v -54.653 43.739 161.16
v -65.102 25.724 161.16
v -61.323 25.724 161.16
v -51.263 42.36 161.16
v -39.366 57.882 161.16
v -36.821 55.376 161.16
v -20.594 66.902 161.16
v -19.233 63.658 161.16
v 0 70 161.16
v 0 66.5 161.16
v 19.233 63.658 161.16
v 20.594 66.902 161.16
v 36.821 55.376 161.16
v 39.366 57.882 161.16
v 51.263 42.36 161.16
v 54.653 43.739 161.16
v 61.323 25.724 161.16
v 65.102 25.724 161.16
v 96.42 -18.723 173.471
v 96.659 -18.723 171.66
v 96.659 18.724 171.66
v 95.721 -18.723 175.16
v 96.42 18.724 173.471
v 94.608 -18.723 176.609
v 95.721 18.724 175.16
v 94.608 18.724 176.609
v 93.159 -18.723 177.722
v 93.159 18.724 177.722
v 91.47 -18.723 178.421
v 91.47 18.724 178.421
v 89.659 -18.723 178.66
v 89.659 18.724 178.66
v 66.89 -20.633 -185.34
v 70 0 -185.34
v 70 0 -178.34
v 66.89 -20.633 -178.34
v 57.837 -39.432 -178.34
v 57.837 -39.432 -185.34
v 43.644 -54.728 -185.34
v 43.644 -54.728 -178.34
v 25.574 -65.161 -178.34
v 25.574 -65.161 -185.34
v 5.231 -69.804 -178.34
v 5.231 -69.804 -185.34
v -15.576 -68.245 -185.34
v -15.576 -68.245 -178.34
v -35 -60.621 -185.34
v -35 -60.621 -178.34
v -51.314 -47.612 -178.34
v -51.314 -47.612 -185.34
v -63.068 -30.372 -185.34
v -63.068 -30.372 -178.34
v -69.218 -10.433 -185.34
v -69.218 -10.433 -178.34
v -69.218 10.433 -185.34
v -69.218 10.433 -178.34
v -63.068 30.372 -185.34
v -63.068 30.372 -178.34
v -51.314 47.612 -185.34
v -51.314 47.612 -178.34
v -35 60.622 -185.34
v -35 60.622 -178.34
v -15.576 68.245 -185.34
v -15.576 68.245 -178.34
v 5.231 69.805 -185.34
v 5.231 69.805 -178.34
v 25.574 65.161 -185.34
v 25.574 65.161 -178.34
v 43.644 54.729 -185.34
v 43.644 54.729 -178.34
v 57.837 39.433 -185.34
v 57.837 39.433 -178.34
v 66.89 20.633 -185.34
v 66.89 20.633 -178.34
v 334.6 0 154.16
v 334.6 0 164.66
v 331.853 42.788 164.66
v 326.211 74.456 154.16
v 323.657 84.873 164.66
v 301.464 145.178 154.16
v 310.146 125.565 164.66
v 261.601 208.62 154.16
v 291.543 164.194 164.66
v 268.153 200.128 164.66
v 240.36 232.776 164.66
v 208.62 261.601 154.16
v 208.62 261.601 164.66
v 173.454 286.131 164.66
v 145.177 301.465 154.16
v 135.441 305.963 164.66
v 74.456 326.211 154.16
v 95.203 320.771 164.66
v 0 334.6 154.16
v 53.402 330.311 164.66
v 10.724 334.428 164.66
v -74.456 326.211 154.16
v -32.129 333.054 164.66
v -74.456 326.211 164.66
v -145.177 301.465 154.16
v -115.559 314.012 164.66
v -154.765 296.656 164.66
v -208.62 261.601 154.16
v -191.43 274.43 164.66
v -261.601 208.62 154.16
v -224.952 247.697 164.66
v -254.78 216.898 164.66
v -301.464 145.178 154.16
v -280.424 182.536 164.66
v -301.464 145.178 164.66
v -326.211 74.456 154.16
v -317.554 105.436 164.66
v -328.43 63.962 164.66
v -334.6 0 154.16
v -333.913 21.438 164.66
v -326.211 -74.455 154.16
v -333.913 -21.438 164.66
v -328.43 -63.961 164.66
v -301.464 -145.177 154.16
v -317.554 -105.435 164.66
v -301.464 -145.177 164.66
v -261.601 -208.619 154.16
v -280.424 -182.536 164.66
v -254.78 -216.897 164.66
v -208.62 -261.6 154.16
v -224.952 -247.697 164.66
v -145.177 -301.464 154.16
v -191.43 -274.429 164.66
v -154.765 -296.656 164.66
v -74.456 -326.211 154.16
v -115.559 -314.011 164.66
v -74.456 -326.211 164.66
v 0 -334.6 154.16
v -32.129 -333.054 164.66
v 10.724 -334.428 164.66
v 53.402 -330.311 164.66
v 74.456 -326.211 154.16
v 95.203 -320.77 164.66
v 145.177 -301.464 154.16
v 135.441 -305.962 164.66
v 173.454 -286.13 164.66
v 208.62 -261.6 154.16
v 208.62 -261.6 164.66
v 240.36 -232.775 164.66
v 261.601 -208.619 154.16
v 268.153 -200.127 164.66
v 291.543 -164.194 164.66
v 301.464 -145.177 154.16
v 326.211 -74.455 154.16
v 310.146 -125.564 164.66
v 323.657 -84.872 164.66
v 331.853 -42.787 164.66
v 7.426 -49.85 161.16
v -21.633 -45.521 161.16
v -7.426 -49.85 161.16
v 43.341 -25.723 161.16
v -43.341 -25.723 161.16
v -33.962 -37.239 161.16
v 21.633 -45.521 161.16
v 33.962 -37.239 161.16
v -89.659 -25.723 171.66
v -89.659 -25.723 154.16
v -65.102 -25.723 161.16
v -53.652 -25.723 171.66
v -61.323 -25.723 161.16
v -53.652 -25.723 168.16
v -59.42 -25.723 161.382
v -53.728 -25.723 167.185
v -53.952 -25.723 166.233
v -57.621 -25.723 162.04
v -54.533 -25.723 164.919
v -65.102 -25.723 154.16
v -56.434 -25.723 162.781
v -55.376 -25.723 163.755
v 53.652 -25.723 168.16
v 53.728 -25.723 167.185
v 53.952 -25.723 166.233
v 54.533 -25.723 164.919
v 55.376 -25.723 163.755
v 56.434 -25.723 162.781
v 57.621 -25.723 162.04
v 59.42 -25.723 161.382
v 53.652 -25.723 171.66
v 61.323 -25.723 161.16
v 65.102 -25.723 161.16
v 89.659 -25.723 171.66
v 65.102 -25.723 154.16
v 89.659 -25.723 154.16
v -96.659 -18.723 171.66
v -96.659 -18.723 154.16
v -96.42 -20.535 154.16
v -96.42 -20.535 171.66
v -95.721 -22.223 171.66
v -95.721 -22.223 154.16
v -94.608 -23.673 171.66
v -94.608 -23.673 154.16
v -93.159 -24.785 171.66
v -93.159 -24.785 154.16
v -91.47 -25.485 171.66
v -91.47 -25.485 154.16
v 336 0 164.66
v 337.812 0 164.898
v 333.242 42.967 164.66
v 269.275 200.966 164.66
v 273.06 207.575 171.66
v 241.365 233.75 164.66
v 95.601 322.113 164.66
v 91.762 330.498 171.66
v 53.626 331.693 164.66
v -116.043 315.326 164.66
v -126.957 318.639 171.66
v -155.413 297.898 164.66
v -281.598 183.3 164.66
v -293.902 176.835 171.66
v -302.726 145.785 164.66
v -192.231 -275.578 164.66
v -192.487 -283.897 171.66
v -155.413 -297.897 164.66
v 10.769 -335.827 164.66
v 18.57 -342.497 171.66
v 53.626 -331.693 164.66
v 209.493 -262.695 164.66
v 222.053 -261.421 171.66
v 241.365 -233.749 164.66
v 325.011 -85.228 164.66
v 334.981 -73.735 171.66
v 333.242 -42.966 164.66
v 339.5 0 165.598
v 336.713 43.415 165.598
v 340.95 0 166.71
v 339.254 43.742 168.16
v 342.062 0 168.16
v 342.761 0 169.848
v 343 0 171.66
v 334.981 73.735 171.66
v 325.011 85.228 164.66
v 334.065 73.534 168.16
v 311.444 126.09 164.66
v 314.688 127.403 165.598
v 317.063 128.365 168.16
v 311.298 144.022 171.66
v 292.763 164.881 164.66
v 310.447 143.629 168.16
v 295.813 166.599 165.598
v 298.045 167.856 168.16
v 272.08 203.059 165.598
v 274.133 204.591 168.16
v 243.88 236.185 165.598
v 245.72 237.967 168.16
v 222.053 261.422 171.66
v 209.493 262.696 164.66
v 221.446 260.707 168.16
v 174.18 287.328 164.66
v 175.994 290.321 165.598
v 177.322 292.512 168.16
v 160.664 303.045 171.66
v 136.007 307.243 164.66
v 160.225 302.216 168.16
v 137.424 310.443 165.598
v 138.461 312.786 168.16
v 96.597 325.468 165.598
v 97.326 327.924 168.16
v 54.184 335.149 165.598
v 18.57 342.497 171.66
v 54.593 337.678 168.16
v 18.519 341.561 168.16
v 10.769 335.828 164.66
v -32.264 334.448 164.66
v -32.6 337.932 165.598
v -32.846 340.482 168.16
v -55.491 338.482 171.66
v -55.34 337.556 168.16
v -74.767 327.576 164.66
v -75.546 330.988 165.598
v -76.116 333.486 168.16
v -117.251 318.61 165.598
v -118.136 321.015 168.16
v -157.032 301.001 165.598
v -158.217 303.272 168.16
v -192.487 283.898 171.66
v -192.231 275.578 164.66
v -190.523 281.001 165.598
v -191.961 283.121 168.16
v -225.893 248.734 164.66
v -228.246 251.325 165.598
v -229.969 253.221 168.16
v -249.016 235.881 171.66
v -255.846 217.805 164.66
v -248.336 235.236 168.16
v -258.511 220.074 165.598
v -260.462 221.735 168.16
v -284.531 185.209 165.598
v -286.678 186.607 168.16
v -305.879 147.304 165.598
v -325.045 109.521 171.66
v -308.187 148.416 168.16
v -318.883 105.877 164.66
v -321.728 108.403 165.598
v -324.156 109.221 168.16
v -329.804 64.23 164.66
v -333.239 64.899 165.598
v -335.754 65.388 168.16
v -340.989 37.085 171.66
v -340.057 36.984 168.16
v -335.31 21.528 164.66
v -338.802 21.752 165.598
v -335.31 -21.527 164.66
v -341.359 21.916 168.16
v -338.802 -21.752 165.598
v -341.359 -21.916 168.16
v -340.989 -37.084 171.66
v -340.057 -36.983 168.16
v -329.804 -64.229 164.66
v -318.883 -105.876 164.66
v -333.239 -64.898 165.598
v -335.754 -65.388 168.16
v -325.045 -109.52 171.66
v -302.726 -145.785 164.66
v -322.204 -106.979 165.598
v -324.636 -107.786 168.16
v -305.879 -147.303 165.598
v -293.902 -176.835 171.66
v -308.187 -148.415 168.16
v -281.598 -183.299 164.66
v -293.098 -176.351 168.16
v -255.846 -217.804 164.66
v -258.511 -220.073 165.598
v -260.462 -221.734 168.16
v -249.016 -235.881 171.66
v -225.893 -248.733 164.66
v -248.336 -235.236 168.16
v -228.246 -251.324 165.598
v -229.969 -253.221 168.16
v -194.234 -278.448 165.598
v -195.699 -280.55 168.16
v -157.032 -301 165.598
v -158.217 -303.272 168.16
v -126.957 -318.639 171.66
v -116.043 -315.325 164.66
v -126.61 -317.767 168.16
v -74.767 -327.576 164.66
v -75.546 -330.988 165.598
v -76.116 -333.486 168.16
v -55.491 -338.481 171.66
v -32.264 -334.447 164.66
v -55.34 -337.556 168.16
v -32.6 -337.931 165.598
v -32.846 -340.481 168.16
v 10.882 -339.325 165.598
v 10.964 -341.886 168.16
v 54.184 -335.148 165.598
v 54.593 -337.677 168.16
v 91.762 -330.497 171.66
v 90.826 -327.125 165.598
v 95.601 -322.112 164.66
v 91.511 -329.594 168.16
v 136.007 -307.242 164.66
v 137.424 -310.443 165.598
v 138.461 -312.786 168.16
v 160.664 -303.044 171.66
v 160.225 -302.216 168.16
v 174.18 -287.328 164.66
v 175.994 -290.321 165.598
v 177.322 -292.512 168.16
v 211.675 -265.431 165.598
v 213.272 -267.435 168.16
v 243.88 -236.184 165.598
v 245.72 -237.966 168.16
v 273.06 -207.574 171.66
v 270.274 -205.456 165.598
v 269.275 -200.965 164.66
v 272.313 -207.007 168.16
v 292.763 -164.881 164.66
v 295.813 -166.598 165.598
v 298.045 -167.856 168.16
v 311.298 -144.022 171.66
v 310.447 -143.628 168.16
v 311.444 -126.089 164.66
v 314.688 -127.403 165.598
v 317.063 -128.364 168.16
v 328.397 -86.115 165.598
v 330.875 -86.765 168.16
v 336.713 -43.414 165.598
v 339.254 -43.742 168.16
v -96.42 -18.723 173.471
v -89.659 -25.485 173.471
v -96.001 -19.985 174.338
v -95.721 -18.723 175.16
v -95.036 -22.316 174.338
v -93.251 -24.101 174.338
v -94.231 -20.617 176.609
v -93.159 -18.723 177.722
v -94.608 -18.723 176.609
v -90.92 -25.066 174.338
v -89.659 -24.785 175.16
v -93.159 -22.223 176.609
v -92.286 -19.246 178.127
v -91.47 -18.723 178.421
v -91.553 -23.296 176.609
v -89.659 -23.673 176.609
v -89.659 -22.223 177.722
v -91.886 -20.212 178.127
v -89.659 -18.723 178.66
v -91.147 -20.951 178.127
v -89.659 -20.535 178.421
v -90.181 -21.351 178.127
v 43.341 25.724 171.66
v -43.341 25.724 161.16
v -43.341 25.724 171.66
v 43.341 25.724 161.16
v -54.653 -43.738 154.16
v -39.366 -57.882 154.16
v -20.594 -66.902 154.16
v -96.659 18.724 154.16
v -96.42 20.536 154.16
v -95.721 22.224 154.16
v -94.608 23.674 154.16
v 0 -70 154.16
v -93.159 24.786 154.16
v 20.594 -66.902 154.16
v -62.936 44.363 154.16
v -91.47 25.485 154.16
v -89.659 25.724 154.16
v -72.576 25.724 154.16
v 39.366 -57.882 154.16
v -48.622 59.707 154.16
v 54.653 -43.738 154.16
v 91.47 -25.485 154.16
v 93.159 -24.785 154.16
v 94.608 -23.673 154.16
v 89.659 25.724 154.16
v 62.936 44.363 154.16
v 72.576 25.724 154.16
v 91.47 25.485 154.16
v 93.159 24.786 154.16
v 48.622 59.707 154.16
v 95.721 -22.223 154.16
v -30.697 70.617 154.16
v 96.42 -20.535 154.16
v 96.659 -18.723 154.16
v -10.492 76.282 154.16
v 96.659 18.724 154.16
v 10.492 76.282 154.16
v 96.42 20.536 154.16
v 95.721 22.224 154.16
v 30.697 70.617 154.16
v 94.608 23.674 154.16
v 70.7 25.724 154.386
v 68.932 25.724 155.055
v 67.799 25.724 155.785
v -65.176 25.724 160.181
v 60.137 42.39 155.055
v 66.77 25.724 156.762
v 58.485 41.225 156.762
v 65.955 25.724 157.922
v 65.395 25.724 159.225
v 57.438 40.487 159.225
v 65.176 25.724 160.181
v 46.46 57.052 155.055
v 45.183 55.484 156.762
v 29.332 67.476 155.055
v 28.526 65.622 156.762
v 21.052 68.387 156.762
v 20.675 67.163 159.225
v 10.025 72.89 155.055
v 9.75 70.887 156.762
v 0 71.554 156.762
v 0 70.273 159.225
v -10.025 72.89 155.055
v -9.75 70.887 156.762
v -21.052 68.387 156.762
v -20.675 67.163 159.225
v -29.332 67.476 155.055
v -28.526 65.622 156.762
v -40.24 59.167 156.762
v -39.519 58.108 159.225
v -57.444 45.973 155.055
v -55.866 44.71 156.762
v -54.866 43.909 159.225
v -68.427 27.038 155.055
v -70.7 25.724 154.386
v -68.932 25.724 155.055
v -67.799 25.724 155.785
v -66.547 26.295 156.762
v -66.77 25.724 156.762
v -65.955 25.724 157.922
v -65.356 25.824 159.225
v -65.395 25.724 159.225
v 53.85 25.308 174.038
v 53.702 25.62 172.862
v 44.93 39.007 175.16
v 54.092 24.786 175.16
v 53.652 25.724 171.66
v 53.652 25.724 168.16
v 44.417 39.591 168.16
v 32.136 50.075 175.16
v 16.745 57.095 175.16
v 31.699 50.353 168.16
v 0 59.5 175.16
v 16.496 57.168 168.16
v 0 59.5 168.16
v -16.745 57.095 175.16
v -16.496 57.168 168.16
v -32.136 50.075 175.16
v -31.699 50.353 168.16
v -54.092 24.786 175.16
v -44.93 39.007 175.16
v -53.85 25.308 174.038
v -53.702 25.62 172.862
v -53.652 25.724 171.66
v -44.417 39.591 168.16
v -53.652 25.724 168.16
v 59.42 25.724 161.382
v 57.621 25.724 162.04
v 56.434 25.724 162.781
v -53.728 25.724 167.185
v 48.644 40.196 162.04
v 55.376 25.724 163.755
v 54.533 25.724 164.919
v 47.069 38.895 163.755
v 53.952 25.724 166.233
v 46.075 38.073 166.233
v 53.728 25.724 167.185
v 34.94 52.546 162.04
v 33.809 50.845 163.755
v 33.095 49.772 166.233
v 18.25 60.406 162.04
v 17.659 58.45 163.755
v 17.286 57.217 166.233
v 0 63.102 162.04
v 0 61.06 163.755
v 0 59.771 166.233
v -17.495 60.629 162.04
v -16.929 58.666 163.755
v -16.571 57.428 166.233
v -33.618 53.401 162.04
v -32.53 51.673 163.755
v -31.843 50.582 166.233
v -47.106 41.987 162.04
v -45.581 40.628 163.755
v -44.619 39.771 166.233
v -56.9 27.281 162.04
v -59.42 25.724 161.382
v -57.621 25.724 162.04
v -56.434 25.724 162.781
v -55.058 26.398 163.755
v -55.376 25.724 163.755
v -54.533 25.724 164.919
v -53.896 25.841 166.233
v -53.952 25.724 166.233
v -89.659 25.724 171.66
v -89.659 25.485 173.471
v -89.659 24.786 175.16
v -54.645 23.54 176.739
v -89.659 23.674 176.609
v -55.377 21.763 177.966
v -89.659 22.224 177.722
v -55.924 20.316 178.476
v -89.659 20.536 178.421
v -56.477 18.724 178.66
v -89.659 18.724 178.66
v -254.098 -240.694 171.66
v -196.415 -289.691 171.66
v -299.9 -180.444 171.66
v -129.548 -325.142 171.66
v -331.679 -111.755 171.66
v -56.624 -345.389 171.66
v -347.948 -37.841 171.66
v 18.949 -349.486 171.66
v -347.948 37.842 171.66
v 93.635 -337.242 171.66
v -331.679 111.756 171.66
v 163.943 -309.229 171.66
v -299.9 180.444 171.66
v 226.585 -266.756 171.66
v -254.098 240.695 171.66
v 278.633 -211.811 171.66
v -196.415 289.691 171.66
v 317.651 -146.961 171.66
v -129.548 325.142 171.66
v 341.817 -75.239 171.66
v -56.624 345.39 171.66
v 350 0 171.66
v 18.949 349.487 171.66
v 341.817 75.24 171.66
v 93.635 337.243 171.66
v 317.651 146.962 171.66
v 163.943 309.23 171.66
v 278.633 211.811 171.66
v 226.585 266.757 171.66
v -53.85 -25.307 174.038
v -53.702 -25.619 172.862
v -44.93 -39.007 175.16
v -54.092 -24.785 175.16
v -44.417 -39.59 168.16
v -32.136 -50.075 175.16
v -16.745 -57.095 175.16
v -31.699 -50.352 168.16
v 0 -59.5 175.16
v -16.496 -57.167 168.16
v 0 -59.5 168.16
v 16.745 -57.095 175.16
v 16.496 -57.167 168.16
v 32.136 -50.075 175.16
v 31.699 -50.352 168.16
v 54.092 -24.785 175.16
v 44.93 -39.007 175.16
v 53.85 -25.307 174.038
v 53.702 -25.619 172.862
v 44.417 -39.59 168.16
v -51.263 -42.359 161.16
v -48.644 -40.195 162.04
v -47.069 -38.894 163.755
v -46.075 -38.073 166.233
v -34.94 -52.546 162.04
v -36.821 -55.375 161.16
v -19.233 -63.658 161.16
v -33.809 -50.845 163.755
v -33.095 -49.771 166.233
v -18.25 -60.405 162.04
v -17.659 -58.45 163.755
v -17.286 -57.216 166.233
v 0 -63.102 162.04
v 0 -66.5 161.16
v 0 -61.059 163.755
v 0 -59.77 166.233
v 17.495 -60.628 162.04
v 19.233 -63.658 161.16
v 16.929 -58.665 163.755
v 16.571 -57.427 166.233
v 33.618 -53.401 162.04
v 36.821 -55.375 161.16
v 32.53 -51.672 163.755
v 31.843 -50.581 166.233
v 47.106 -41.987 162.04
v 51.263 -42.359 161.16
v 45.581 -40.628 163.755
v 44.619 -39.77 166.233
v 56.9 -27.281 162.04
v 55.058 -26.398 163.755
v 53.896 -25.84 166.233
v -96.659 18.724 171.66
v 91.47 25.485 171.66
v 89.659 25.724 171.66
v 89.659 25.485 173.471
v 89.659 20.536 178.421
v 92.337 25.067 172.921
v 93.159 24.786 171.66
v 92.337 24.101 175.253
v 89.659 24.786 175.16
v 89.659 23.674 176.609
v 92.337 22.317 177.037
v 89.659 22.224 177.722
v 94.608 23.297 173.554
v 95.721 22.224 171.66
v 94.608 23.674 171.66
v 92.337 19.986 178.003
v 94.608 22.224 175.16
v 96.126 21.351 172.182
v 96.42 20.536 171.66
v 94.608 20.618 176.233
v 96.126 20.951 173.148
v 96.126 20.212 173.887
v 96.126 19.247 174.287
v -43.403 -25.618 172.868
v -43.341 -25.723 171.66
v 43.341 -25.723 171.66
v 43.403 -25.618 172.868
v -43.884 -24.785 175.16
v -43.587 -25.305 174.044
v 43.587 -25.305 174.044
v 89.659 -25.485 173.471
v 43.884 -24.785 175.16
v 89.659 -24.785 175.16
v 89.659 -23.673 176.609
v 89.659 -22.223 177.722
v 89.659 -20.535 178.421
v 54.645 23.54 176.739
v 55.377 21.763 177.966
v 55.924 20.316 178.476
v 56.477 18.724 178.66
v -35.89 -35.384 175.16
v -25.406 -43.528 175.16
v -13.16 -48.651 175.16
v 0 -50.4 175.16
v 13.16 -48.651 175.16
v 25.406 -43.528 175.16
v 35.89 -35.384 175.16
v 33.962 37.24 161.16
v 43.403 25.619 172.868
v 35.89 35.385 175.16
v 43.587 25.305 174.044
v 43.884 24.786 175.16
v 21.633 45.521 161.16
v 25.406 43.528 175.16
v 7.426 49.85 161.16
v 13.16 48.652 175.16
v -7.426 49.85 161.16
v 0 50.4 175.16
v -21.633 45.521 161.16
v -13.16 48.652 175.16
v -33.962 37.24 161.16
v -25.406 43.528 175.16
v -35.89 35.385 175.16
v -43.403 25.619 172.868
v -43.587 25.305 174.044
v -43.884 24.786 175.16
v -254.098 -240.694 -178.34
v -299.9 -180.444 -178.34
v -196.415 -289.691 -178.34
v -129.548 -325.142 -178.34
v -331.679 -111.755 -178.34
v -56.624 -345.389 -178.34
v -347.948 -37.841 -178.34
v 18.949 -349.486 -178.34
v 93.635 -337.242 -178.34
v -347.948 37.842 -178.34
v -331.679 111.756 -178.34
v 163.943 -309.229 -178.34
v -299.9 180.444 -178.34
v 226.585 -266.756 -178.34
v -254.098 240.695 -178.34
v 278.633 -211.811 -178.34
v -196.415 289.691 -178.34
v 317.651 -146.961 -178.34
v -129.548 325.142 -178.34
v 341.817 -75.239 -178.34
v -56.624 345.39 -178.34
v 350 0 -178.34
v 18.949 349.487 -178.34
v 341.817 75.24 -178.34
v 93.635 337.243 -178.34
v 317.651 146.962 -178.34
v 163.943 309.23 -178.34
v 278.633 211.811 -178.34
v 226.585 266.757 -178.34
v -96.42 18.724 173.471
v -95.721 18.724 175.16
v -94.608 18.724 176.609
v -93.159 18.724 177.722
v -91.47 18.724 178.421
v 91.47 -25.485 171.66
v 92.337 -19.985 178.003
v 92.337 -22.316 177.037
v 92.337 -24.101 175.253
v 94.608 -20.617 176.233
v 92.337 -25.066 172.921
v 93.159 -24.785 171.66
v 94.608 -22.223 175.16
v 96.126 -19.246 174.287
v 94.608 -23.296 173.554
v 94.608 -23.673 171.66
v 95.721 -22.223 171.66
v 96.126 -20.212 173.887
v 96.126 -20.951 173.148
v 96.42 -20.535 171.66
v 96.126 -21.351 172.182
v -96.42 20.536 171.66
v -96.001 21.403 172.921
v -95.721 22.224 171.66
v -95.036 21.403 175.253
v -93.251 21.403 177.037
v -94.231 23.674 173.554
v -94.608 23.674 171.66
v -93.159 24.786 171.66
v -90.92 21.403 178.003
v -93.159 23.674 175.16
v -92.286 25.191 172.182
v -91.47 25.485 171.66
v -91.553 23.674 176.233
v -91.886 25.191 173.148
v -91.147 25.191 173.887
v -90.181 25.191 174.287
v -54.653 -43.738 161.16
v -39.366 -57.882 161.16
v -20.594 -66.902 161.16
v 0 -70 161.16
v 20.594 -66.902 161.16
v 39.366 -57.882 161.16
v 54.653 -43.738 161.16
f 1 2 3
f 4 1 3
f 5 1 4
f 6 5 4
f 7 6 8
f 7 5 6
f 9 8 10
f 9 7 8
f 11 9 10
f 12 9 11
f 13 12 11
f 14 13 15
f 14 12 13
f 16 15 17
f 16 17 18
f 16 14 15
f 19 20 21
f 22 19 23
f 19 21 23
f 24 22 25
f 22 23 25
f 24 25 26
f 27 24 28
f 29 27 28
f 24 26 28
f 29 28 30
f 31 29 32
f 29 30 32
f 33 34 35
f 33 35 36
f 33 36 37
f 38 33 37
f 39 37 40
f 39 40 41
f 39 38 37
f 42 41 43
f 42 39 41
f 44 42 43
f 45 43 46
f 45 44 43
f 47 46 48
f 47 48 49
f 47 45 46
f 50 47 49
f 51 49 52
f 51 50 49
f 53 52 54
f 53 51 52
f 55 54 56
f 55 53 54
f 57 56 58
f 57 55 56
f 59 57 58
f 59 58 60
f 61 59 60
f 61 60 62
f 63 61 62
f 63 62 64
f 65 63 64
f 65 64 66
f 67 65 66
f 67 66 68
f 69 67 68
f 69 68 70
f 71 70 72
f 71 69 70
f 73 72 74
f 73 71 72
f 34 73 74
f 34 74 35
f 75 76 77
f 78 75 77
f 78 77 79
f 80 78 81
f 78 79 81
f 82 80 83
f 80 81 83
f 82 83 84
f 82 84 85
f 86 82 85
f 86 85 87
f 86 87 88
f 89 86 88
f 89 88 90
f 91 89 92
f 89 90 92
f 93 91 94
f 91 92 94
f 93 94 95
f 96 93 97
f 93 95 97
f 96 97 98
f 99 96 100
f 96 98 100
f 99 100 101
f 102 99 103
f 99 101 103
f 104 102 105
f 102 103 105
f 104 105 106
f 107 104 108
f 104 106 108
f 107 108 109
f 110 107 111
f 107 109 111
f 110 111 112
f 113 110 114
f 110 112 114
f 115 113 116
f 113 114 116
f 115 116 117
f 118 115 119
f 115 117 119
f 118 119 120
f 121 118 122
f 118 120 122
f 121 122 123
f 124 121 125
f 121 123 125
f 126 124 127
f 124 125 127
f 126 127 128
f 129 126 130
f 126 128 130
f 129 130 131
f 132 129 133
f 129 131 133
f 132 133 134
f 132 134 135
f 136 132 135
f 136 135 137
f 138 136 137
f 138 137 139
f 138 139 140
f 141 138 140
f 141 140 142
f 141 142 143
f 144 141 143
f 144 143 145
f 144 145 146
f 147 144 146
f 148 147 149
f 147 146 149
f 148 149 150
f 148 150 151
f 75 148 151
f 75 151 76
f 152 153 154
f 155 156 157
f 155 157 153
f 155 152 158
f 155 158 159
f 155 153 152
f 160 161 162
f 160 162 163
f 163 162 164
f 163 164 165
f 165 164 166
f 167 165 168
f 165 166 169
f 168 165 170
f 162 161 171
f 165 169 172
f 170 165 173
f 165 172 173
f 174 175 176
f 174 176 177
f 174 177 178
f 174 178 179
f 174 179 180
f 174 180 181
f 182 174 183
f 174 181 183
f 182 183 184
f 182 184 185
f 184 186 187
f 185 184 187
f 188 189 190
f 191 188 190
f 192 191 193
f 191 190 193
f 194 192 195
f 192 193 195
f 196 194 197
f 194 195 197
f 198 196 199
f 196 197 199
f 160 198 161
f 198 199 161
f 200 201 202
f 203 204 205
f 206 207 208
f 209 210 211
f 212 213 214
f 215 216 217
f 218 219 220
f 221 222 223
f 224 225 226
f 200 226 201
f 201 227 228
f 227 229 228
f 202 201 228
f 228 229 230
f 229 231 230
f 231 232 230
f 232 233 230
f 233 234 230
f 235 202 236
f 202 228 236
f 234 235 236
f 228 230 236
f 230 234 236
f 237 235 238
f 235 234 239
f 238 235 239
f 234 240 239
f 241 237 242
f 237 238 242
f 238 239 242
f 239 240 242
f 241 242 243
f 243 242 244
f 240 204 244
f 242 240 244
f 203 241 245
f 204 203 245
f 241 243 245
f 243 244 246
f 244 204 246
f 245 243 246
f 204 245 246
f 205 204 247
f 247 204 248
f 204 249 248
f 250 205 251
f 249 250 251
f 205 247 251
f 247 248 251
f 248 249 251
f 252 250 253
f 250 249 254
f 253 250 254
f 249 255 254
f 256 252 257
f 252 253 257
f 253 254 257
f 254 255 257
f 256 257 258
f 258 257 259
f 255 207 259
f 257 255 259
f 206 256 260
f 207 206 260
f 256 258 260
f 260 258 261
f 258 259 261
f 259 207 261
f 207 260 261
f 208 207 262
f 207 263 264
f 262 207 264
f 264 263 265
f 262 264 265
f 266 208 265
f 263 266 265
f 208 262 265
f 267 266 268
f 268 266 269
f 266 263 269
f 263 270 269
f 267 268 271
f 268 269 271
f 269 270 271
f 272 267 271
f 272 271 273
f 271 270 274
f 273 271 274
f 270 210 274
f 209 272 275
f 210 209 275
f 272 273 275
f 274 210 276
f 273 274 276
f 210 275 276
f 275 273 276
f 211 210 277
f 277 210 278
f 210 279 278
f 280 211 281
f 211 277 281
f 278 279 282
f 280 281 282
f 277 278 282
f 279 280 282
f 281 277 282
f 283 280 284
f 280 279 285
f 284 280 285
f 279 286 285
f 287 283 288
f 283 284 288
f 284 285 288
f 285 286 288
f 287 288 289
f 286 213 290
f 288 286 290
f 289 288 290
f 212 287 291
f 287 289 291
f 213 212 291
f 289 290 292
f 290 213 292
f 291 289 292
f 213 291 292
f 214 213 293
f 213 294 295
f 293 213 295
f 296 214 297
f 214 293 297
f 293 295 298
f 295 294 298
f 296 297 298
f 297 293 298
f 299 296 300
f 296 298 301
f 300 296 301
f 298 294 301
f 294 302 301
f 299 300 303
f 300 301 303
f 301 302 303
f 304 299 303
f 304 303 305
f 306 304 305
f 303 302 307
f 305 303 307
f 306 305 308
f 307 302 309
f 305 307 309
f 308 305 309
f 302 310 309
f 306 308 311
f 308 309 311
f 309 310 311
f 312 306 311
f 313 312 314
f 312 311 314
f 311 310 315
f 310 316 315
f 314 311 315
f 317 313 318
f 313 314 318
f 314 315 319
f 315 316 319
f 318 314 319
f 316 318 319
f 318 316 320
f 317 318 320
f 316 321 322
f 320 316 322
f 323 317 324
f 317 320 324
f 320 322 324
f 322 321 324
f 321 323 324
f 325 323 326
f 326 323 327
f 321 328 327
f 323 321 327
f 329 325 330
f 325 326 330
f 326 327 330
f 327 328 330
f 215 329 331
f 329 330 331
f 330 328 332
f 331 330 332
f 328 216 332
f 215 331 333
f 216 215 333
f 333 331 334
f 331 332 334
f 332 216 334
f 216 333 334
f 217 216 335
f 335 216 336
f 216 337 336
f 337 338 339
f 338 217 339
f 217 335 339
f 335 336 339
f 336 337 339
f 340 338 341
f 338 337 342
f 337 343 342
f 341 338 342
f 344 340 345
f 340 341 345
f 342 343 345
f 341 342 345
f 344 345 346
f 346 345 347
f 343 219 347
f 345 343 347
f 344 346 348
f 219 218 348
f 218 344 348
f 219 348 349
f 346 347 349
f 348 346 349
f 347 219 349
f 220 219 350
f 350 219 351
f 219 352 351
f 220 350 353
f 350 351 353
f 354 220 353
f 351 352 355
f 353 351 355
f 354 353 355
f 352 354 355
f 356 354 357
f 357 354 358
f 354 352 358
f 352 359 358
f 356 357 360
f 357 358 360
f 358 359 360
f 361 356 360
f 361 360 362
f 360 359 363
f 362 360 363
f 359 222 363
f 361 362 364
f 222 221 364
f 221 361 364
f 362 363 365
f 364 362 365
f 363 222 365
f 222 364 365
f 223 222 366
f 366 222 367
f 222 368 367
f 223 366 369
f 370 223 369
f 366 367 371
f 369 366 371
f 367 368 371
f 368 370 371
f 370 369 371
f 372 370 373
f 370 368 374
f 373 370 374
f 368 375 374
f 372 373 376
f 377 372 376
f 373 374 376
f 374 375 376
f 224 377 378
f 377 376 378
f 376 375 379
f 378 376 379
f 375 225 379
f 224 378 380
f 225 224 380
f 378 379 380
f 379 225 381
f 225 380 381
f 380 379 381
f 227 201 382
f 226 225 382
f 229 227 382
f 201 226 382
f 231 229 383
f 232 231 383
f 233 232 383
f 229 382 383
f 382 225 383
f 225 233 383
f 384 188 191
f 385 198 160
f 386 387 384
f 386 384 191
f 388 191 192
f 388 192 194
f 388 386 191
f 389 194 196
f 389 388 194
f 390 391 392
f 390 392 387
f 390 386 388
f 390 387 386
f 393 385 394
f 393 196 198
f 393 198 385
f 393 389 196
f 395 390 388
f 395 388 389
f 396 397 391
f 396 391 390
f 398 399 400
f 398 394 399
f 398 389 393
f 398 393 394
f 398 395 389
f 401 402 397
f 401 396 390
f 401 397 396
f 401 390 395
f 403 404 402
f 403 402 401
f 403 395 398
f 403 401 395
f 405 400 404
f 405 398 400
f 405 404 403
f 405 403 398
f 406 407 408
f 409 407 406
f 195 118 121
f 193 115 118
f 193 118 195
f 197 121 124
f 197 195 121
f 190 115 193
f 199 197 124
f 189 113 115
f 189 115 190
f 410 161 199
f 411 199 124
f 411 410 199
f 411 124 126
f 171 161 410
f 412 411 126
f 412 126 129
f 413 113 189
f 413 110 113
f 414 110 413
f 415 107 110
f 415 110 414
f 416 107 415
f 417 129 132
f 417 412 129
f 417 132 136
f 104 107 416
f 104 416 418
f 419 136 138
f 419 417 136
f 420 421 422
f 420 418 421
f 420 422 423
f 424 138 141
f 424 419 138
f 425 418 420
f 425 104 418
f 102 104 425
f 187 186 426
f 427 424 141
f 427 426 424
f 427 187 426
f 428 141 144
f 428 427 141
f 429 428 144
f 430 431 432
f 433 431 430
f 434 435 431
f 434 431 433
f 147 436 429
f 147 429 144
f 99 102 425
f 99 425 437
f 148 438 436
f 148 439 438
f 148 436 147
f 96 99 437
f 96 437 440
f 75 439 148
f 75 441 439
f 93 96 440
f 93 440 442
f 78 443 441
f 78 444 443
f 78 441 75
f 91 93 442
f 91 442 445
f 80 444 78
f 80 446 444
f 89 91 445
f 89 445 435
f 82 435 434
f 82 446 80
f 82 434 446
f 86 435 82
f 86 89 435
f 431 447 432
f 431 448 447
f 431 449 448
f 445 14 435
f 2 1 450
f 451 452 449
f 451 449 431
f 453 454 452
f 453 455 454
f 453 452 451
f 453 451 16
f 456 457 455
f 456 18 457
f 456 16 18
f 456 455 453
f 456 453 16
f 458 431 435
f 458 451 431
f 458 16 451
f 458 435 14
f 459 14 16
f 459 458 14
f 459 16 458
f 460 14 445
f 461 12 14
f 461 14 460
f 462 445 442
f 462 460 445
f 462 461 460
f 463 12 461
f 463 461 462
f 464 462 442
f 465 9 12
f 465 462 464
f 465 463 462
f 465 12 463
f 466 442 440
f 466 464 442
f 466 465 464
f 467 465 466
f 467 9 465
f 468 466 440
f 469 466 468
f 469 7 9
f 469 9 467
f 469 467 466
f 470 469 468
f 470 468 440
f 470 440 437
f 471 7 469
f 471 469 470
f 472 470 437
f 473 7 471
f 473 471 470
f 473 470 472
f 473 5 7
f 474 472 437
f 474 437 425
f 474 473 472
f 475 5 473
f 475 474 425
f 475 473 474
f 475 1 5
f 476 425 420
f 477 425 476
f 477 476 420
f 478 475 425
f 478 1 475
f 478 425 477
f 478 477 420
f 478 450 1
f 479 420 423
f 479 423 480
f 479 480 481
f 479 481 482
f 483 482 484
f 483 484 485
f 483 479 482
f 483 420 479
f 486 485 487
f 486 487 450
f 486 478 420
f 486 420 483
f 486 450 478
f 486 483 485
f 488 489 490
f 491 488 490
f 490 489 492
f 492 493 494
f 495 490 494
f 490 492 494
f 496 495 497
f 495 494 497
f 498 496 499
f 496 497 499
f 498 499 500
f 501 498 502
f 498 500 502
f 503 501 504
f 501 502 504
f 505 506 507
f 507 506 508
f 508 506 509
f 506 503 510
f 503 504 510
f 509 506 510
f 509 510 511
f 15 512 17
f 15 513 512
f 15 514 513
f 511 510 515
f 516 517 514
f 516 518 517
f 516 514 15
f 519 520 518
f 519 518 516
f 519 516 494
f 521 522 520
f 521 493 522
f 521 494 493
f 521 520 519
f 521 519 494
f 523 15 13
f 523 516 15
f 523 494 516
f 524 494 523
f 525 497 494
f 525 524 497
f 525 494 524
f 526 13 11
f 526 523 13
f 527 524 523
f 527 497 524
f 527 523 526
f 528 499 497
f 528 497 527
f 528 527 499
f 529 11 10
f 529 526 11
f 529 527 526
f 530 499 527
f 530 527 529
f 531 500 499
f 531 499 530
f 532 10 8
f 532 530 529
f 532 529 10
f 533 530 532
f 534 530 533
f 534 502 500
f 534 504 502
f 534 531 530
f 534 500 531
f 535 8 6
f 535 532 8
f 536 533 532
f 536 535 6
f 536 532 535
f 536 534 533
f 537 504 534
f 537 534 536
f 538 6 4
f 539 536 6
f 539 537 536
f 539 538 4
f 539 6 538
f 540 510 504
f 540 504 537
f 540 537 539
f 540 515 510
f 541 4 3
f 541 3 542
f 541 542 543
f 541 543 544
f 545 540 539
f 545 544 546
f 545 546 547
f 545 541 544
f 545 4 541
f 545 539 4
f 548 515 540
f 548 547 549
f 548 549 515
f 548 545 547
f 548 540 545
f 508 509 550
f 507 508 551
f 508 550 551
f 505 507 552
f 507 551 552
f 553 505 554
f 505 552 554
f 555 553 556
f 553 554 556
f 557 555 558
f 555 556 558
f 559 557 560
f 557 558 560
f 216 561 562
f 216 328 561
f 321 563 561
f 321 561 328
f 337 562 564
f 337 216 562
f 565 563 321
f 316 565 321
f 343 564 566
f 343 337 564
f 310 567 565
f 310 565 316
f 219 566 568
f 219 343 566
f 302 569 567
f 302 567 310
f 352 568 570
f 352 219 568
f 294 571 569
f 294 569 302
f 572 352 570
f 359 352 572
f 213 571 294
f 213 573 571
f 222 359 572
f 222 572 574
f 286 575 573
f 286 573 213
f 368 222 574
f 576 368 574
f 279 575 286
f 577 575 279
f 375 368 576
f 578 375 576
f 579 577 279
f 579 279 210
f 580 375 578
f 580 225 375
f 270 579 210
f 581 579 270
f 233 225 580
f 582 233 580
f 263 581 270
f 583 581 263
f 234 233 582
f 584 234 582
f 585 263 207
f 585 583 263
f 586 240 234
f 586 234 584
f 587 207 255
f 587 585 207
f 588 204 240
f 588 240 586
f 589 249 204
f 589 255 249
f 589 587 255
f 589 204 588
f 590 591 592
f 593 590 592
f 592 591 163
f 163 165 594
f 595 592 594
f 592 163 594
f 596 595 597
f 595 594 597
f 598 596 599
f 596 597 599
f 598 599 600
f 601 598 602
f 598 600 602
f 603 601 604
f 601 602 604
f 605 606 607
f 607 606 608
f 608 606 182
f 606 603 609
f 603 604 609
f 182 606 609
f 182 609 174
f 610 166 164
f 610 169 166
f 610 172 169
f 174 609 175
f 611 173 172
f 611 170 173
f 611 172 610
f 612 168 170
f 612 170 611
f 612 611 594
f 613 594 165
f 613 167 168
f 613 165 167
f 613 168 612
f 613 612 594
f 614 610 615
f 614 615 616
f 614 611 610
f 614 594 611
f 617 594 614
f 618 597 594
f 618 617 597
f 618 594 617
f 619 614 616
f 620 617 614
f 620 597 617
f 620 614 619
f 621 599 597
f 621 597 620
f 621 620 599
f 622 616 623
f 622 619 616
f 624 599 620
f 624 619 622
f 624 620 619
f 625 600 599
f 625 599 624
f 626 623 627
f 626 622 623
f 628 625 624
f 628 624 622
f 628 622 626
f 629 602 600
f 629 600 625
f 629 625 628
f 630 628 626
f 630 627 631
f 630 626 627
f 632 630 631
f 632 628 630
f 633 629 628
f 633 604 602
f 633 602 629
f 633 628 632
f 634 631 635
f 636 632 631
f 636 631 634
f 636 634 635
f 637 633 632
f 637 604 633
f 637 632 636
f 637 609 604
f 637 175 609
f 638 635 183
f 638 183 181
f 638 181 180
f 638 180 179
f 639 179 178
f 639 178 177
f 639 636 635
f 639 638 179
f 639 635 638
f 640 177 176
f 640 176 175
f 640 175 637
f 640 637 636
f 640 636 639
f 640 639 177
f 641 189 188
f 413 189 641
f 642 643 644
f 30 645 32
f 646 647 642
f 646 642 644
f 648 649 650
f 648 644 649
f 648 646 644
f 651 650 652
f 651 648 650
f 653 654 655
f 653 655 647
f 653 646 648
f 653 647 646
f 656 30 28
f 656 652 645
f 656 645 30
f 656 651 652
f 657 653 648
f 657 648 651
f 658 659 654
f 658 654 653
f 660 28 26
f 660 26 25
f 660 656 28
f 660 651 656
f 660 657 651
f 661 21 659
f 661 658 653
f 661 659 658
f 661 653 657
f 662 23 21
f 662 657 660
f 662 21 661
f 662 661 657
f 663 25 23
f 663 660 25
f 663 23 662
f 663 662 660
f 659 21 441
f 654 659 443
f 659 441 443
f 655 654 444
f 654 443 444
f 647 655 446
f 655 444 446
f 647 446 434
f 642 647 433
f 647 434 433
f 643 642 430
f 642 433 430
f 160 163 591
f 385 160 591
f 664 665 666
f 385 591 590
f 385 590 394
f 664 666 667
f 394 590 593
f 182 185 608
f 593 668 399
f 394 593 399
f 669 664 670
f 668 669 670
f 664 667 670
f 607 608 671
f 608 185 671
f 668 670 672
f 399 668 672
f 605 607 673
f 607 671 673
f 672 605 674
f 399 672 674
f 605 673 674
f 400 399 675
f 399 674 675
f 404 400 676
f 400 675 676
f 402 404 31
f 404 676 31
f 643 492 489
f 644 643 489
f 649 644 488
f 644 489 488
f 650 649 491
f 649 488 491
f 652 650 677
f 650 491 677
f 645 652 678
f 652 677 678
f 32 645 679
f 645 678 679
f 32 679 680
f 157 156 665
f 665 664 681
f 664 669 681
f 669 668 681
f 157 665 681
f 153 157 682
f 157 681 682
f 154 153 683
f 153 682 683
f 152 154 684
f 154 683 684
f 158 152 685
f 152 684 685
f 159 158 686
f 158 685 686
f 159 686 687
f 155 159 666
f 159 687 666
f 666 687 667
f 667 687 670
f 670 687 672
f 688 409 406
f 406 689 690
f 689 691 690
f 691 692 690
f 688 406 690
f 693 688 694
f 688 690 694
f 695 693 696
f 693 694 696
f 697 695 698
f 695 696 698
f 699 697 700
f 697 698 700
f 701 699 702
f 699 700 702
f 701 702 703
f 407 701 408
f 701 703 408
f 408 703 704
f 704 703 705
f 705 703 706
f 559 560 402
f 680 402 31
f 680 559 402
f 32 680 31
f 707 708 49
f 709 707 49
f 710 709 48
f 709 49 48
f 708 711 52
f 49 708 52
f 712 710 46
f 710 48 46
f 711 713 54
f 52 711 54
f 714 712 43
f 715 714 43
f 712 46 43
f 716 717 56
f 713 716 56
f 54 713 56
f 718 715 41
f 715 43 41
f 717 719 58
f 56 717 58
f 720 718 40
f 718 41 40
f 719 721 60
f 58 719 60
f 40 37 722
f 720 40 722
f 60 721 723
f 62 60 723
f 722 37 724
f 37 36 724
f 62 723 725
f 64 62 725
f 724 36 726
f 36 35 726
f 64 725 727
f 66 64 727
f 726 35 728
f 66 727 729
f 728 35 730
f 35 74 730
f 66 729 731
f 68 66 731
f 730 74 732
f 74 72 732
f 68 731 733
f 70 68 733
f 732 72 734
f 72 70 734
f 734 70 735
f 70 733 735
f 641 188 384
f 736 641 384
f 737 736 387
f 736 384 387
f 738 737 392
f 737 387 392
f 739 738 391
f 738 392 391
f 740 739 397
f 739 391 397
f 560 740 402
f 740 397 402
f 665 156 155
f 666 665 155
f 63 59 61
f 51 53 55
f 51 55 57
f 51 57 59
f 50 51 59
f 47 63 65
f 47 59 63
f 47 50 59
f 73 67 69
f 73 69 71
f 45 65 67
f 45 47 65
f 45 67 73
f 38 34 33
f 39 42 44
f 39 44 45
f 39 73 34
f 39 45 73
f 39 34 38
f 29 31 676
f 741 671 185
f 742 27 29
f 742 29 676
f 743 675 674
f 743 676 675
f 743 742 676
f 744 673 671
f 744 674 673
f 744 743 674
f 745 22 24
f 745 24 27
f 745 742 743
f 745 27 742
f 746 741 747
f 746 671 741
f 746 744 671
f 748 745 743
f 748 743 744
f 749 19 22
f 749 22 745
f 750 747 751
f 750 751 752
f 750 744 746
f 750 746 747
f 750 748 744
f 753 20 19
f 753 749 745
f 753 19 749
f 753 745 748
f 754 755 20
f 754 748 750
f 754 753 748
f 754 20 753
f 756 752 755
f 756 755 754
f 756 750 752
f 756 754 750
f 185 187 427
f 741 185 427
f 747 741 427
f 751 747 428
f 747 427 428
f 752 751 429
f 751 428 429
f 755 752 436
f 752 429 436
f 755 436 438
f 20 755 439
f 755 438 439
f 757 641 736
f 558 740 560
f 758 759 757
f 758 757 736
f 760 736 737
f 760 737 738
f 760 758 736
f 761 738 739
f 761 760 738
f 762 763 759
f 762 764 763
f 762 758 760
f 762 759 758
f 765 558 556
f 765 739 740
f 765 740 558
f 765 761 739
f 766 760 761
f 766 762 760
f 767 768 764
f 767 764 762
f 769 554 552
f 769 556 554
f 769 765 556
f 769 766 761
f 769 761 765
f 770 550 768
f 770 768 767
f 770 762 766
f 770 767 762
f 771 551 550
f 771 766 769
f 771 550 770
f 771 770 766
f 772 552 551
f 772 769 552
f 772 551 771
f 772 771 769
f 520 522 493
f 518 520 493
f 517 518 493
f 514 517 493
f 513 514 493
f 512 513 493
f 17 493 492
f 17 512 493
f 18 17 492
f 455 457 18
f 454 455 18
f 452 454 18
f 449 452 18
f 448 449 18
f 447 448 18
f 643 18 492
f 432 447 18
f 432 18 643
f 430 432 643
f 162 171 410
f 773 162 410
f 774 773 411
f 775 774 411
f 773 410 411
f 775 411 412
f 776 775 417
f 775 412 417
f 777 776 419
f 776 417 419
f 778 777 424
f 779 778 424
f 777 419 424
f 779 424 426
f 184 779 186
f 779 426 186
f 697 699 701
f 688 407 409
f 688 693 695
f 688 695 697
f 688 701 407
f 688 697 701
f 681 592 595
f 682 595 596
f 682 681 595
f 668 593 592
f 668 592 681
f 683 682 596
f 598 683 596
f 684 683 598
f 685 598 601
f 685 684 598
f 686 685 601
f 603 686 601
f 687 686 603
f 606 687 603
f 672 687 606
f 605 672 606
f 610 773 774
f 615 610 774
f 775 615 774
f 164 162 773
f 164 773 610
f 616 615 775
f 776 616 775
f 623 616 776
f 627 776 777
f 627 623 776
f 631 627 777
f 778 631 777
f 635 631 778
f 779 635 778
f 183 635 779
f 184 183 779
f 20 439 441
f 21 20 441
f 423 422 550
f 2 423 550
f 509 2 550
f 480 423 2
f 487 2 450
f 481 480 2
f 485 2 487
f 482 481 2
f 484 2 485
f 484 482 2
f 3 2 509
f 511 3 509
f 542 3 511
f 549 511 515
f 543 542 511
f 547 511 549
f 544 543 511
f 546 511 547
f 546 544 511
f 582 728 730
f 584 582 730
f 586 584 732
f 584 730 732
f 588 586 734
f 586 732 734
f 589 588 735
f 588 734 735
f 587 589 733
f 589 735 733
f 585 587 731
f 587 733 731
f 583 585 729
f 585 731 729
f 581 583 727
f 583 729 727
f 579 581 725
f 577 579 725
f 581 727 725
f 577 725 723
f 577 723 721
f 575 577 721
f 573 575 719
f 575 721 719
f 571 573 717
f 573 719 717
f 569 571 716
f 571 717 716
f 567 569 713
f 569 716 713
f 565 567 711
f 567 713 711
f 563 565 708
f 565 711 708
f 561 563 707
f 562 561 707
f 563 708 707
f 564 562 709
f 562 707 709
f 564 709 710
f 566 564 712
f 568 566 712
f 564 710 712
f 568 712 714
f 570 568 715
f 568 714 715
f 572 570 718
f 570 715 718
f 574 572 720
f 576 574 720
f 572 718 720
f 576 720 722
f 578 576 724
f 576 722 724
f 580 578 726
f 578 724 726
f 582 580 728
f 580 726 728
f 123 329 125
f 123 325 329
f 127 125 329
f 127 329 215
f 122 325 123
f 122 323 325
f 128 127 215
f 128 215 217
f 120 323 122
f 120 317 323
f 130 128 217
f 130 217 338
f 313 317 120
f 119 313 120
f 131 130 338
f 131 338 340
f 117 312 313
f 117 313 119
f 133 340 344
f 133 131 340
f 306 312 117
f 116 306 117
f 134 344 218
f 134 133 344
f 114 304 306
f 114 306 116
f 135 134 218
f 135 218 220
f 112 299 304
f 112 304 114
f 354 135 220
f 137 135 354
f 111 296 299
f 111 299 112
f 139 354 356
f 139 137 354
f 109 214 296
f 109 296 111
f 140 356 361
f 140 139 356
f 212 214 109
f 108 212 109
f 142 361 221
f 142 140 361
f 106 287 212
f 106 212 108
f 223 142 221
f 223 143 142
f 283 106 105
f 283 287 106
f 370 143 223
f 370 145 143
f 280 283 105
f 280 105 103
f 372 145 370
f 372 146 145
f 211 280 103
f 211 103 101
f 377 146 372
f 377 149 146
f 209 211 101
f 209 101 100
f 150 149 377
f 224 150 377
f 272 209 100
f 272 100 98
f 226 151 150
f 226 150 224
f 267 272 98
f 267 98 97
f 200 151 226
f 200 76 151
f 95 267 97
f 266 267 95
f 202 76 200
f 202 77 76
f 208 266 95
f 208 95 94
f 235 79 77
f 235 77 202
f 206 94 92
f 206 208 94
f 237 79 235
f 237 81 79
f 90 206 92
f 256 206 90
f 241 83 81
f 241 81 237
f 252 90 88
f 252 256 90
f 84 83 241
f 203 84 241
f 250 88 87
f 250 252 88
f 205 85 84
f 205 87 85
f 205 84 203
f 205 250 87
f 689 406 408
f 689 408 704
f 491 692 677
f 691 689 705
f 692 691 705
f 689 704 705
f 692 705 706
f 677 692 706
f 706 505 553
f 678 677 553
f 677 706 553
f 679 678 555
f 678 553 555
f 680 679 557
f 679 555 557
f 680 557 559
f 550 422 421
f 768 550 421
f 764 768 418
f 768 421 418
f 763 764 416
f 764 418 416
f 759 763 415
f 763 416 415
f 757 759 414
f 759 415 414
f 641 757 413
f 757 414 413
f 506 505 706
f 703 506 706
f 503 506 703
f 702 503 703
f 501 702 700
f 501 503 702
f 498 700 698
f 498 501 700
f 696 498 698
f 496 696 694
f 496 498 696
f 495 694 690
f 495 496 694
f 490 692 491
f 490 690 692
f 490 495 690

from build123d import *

# Parameters (mm, degrees)
BOSS_EXTRUDE1_DEPTH      = 250
BOSS_EXTRUDE1_DEPTH_BACK = 250
SKETCH2_R                = 500
SKETCH3_R                = 490
CUT_EXTRUDE4_DEPTH       = 10
SKETCH5_R                = 478
CUT_EXTRUDE5_DEPTH       = 15
SKETCH6_R                = 100
BOSS_EXTRUDE2_DEPTH      = 10
SKETCH7_R                = 85
BOSS_EXTRUDE3_DEPTH      = 20
SKETCH8_R                = 72
CUT_EXTRUDE6_DEPTH       = 20
FILLET2_R                = 10
SKETCH9_W                = 276.167171278
SKETCH9_H                = 73.496102034
BOSS_EXTRUDE4_DEPTH      = 40
FILLET3_R                = 10
FILLET4_R                = 10
FILLET5_R                = 10
BOSS_EXTRUDE5_START      = 10
SKETCH10_R               = 100
BOSS_EXTRUDE5_DEPTH      = 10
SCALE1_SCALE             = 0.7


# Some blends are built 0.0001 mm under size
with BuildPart() as part:
    # Sketch2 → Boss-Extrude1 (new, two sides: drawn at the far end of the back side and taken through both)
    with BuildSketch(Plane.XY.offset(-BOSS_EXTRUDE1_DEPTH_BACK)):
        Circle(SKETCH2_R)
    extrude(amount=BOSS_EXTRUDE1_DEPTH + BOSS_EXTRUDE1_DEPTH_BACK)

    # Sketch3 → Cut-Extrude4 (cut)
    with BuildSketch(Plane.XY.offset(250)):
        Circle(SKETCH3_R)
    extrude(amount=-CUT_EXTRUDE4_DEPTH, mode=Mode.SUBTRACT)

    # Sketch5 → Cut-Extrude5 (cut)
    with BuildSketch(Plane.XY.offset(240)):
        Circle(SKETCH5_R)
    extrude(amount=-CUT_EXTRUDE5_DEPTH, mode=Mode.SUBTRACT)

    # Sketch6 → Boss-Extrude2 (add)
    with BuildSketch(Plane.XY.offset(225)):
        Circle(SKETCH6_R)
    extrude(amount=BOSS_EXTRUDE2_DEPTH)

    # Sketch7 → Boss-Extrude3 (add)
    with BuildSketch(Plane.XY.offset(235)):
        Circle(SKETCH7_R)
    extrude(amount=BOSS_EXTRUDE3_DEPTH)

    # Sketch8 → Cut-Extrude6 (cut)
    with BuildSketch(Plane.XY.offset(255)):
        Circle(SKETCH8_R)
    extrude(amount=-CUT_EXTRUDE6_DEPTH, mode=Mode.SUBTRACT)

    # Fillet2
    fillet2_edges = [part.edges().sort_by_distance(p)[0] for p in [
        (-85, 0, 235),
    ]]
    fillet(fillet2_edges, radius=FILLET2_R)

    # Sketch9 → Boss-Extrude4 (add)
    with BuildSketch(Plane.XY.offset(220)):
        Rectangle(SKETCH9_W, SKETCH9_H)
    extrude(amount=BOSS_EXTRUDE4_DEPTH)

    # Fillet3
    # the kernel refuses this fillet: 10 mm, written as the material it takes off along each edge
    with BuildSketch(Plane(origin=(128.083585639, -26.748051017, 250), x_dir=(0, 0, 1), z_dir=(1, 0, 0))) as fillet3_piece_1_section:
        Polygon((0, 0), (FILLET3_R * 1.02, 0), (FILLET3_R * 1.02, FILLET3_R * 1.02), (0, FILLET3_R * 1.02), align=None)
    fillet3_piece_1 = extrude(amount=FILLET3_R * 1.02, mode=Mode.PRIVATE)
    fillet3_piece_1 = fillet3_piece_1 - Plane(origin=(128.083585639, -26.748051017, 250), x_dir=(0, 0.7071067811865475, -0.7071067811865475), z_dir=(1, 0, 0)) * Sphere(FILLET3_R, mode=Mode.PRIVATE)
    add(fillet3_piece_1, mode=Mode.SUBTRACT)
    with BuildSketch(Plane(origin=(-128.083585639, -26.748051017, 250), x_dir=(-1, 0, 0), z_dir=(0, 0, 1))) as fillet3_piece_2_section:
        Polygon((0, 0), (FILLET3_R * 1.02, 0), (FILLET3_R * 1.02, FILLET3_R * 1.02), (0, FILLET3_R * 1.02), align=None)
    fillet3_piece_2 = extrude(amount=FILLET3_R * 1.02, mode=Mode.PRIVATE)
    fillet3_piece_2 = fillet3_piece_2 - Plane(origin=(-128.083585639, -26.748051017, 250), x_dir=(0.7071067811865475, 0.7071067811865475, 0), z_dir=(0, 0, 1)) * Sphere(FILLET3_R, mode=Mode.PRIVATE)
    add(fillet3_piece_2, mode=Mode.SUBTRACT)
    with BuildSketch(Plane(origin=(-128.083585639, 26.748051017, 250), x_dir=(0, 0, 1), z_dir=(0, 1, 0))) as fillet3_piece_3_section:
        Polygon((0, 0), (FILLET3_R * 1.02, 0), (FILLET3_R * 1.02, -FILLET3_R * 1.02), (0, -FILLET3_R * 1.02), align=None)
    fillet3_piece_3 = extrude(amount=FILLET3_R * 1.02, mode=Mode.PRIVATE)
    fillet3_piece_3 = fillet3_piece_3 - Plane(origin=(-128.083585639, 26.748051017, 250), x_dir=(0.7071067811865475, 0, -0.7071067811865475), z_dir=(0, 1, 0)) * Sphere(FILLET3_R, mode=Mode.PRIVATE)
    add(fillet3_piece_3, mode=Mode.SUBTRACT)
    with BuildSketch(Plane(origin=(128.083585639, 26.748051017, 250), x_dir=(0, 1, 0), z_dir=(1, 0, 0))) as fillet3_piece_4_section:
        Polygon((0, 0), (FILLET3_R * 1.02, 0), (FILLET3_R * 1.02, FILLET3_R * 1.02), (0, FILLET3_R * 1.02), align=None)
    fillet3_piece_4 = extrude(amount=FILLET3_R * 1.02, mode=Mode.PRIVATE)
    fillet3_piece_4 = fillet3_piece_4 - Plane(origin=(128.083585639, 26.748051017, 250), x_dir=(0, -0.7071067811865475, -0.7071067811865475), z_dir=(1, 0, 0)) * Sphere(FILLET3_R, mode=Mode.PRIVATE)
    add(fillet3_piece_4, mode=Mode.SUBTRACT)
    with BuildSketch(Plane(origin=(128.083585639, -36.748051017, 260), x_dir=(0, 1, 0), z_dir=(-1, 0, 0))) as fillet3_piece_5_section:
        with BuildLine():
            CenterArc((FILLET3_R, FILLET3_R), FILLET3_R, 180, 90)
            Line((0, FILLET3_R), (0, 0))
            Line((0, 0), (FILLET3_R, 0))
        make_face()
    fillet3_piece_5 = extrude(amount=256.167171277, mode=Mode.PRIVATE)
    fillet3_piece_5 = split(fillet3_piece_5, bisect_by=Plane(origin=(102.906545957, -34.337396915, 255), z_dir=(0, 0, 1)), keep=Keep.TOP, mode=Mode.PRIVATE)
    add(fillet3_piece_5, mode=Mode.SUBTRACT)
    with BuildSketch(Plane(origin=(128.083585639, -36.748051017, 260), x_dir=(0, 1, 0), z_dir=(-1, 0, 0))) as fillet3_piece_6_section:
        with BuildLine():
            CenterArc((FILLET3_R, FILLET3_R), FILLET3_R, 180, 90)
            Line((0, FILLET3_R), (0, 0))
            Line((0, 0), (FILLET3_R, 0))
        make_face()
    fillet3_piece_6 = extrude(amount=256.167171277, mode=Mode.PRIVATE)
    fillet3_piece_6 = fillet3_piece_6 - Plane(origin=(0, 0, 253.76582848), x_dir=(1, 0, 0), z_dir=(0, 0, -1)) * Cylinder(85, 553, mode=Mode.PRIVATE)
    add(fillet3_piece_6, mode=Mode.SUBTRACT)
    with BuildSketch(Plane(origin=(128.083585639, -36.748051017, 260), x_dir=(0, 1, 0), z_dir=(-1, 0, 0))) as fillet3_piece_7_section:
        with BuildLine():
            CenterArc((FILLET3_R, FILLET3_R), FILLET3_R, 180, 90)
            Line((0, FILLET3_R), (0, 0))
            Line((0, 0), (FILLET3_R, 0))
        make_face()
    fillet3_piece_7 = extrude(amount=256.167171277, mode=Mode.PRIVATE)
    fillet3_piece_7 = fillet3_piece_7 & Plane(origin=(0, 0, 253.76892881), x_dir=(1, 0, 0), z_dir=(0, 0, 1)) * Cylinder(72, 553, mode=Mode.PRIVATE)
    add(fillet3_piece_7, mode=Mode.SUBTRACT)
    with BuildSketch(Plane(origin=(-138.083585639, -26.748051017, 260), x_dir=(1, 0, 0), z_dir=(0, 1, 0))) as fillet3_piece_8:
        with BuildLine():
            CenterArc((FILLET3_R, FILLET3_R), FILLET3_R, 180, 90)
            Line((0, FILLET3_R), (0, 0))
            Line((0, 0), (FILLET3_R, 0))
        make_face()
    extrude(amount=53.496102033, mode=Mode.SUBTRACT)
    with BuildSketch(Plane(origin=(-128.083585639, 36.748051017, 260), x_dir=(0, 0, -1), z_dir=(1, 0, 0))) as fillet3_piece_9_section:
        with BuildLine():
            CenterArc((FILLET3_R, -FILLET3_R), FILLET3_R, 90, 90)
            Line((0, -FILLET3_R), (0, 0))
            Line((0, 0), (FILLET3_R, 0))
        make_face()
    fillet3_piece_9 = extrude(amount=256.167171277, mode=Mode.PRIVATE)
    fillet3_piece_9 = fillet3_piece_9 - Plane(origin=(0, 0, 253.76582848), x_dir=(1, 0, 0), z_dir=(0, 0, -1)) * Cylinder(85, 553, mode=Mode.PRIVATE)
    add(fillet3_piece_9, mode=Mode.SUBTRACT)
    with BuildSketch(Plane(origin=(-128.083585639, 36.748051017, 260), x_dir=(0, 0, -1), z_dir=(1, 0, 0))) as fillet3_piece_10_section:
        with BuildLine():
            CenterArc((FILLET3_R, -FILLET3_R), FILLET3_R, 90, 90)
            Line((0, -FILLET3_R), (0, 0))
            Line((0, 0), (FILLET3_R, 0))
        make_face()
    fillet3_piece_10 = extrude(amount=256.167171277, mode=Mode.PRIVATE)
    fillet3_piece_10 = split(fillet3_piece_10, bisect_by=Plane(origin=(-70.492794496, 34.331084629, 255), z_dir=(0, 0, 1)), keep=Keep.TOP, mode=Mode.PRIVATE)
    add(fillet3_piece_10, mode=Mode.SUBTRACT)
    with BuildSketch(Plane(origin=(-128.083585639, 36.748051017, 260), x_dir=(0, 0, -1), z_dir=(1, 0, 0))) as fillet3_piece_11_section:
        with BuildLine():
            CenterArc((FILLET3_R, -FILLET3_R), FILLET3_R, 90, 90)
            Line((0, -FILLET3_R), (0, 0))
            Line((0, 0), (FILLET3_R, 0))
        make_face()
    fillet3_piece_11 = extrude(amount=256.167171277, mode=Mode.PRIVATE)
    fillet3_piece_11 = fillet3_piece_11 & Plane(origin=(0, 0, 253.768928808), x_dir=(1, 0, 0), z_dir=(0, 0, 1)) * Cylinder(72, 553, mode=Mode.PRIVATE)
    add(fillet3_piece_11, mode=Mode.SUBTRACT)
    with BuildSketch(Plane(origin=(138.083585639, 26.748051017, 260), x_dir=(0, 0, -1), z_dir=(0, -1, 0))) as fillet3_piece_12:
        with BuildLine():
            CenterArc((FILLET3_R, -FILLET3_R), FILLET3_R, 90, 90)
            Line((0, -FILLET3_R), (0, 0))
            Line((0, 0), (FILLET3_R, 0))
        make_face()
    extrude(amount=53.496102033, mode=Mode.SUBTRACT)
    with BuildSketch(Plane(origin=(138.083585639, 36.748051017, 225), x_dir=(-1, 0, 0), z_dir=(0, 0, 1)), Plane(origin=(138.083585639, -36.748051017, 225), x_dir=(0, 1, 0), z_dir=(0, 0, 1))) as fillet3_piece_13:
        with BuildLine():
            CenterArc((FILLET3_R, FILLET3_R), FILLET3_R, 180, 90)
            Line((0, FILLET3_R), (0, 0))
            Line((0, 0), (FILLET3_R, 0))
        make_face()
    extrude(amount=25, mode=Mode.SUBTRACT)
    with BuildSketch(Plane(origin=(-138.083585639, -36.748051017, 225), x_dir=(0, 1, 0), z_dir=(0, 0, 1)), Plane(origin=(-138.083585639, 36.748051017, 225), x_dir=(1, 0, 0), z_dir=(0, 0, 1))) as fillet3_piece_14:
        with BuildLine():
            CenterArc((FILLET3_R, -FILLET3_R), FILLET3_R, 90, 90)
            Line((0, -FILLET3_R), (0, 0))
            Line((0, 0), (FILLET3_R, 0))
        make_face()
    extrude(amount=25, mode=Mode.SUBTRACT)

    # Fillet4
    fillet4_edges = [part.edges().sort_by_distance(p)[0] for p in [
        (0, 100, 225),
    ]]
    fillet(fillet4_edges, radius=FILLET4_R - 0.0001)  # a hair under: the kernel refuses the full size

    # Fillet5
    fillet5_edges = [part.edges().sort_by_distance(p)[0] for p in [
        (-490, 0, 240),
    ]]
    fillet(fillet5_edges, radius=FILLET5_R - 0.0001)  # a hair under: the kernel refuses the full size

    # Sketch10 → Boss-Extrude5 (add)
    with BuildSketch(Plane(origin=(0, 0, -250), x_dir=(-1, 0, 0), z_dir=(0, 0, -1)).offset(BOSS_EXTRUDE5_START)):
        with Locations(Location((0, 0, 0), (0, 0, 180))):
            Circle(SKETCH10_R)
    extrude(amount=-BOSS_EXTRUDE5_DEPTH)


with BuildPart() as part_1:
    # Scale1: scaled about (0, 0.001114487, -11.134314022)
    add(part.part.scale(SCALE1_SCALE).moved(Location((0, 0.000334346, -3.340294207))))


solid = part_1.part
